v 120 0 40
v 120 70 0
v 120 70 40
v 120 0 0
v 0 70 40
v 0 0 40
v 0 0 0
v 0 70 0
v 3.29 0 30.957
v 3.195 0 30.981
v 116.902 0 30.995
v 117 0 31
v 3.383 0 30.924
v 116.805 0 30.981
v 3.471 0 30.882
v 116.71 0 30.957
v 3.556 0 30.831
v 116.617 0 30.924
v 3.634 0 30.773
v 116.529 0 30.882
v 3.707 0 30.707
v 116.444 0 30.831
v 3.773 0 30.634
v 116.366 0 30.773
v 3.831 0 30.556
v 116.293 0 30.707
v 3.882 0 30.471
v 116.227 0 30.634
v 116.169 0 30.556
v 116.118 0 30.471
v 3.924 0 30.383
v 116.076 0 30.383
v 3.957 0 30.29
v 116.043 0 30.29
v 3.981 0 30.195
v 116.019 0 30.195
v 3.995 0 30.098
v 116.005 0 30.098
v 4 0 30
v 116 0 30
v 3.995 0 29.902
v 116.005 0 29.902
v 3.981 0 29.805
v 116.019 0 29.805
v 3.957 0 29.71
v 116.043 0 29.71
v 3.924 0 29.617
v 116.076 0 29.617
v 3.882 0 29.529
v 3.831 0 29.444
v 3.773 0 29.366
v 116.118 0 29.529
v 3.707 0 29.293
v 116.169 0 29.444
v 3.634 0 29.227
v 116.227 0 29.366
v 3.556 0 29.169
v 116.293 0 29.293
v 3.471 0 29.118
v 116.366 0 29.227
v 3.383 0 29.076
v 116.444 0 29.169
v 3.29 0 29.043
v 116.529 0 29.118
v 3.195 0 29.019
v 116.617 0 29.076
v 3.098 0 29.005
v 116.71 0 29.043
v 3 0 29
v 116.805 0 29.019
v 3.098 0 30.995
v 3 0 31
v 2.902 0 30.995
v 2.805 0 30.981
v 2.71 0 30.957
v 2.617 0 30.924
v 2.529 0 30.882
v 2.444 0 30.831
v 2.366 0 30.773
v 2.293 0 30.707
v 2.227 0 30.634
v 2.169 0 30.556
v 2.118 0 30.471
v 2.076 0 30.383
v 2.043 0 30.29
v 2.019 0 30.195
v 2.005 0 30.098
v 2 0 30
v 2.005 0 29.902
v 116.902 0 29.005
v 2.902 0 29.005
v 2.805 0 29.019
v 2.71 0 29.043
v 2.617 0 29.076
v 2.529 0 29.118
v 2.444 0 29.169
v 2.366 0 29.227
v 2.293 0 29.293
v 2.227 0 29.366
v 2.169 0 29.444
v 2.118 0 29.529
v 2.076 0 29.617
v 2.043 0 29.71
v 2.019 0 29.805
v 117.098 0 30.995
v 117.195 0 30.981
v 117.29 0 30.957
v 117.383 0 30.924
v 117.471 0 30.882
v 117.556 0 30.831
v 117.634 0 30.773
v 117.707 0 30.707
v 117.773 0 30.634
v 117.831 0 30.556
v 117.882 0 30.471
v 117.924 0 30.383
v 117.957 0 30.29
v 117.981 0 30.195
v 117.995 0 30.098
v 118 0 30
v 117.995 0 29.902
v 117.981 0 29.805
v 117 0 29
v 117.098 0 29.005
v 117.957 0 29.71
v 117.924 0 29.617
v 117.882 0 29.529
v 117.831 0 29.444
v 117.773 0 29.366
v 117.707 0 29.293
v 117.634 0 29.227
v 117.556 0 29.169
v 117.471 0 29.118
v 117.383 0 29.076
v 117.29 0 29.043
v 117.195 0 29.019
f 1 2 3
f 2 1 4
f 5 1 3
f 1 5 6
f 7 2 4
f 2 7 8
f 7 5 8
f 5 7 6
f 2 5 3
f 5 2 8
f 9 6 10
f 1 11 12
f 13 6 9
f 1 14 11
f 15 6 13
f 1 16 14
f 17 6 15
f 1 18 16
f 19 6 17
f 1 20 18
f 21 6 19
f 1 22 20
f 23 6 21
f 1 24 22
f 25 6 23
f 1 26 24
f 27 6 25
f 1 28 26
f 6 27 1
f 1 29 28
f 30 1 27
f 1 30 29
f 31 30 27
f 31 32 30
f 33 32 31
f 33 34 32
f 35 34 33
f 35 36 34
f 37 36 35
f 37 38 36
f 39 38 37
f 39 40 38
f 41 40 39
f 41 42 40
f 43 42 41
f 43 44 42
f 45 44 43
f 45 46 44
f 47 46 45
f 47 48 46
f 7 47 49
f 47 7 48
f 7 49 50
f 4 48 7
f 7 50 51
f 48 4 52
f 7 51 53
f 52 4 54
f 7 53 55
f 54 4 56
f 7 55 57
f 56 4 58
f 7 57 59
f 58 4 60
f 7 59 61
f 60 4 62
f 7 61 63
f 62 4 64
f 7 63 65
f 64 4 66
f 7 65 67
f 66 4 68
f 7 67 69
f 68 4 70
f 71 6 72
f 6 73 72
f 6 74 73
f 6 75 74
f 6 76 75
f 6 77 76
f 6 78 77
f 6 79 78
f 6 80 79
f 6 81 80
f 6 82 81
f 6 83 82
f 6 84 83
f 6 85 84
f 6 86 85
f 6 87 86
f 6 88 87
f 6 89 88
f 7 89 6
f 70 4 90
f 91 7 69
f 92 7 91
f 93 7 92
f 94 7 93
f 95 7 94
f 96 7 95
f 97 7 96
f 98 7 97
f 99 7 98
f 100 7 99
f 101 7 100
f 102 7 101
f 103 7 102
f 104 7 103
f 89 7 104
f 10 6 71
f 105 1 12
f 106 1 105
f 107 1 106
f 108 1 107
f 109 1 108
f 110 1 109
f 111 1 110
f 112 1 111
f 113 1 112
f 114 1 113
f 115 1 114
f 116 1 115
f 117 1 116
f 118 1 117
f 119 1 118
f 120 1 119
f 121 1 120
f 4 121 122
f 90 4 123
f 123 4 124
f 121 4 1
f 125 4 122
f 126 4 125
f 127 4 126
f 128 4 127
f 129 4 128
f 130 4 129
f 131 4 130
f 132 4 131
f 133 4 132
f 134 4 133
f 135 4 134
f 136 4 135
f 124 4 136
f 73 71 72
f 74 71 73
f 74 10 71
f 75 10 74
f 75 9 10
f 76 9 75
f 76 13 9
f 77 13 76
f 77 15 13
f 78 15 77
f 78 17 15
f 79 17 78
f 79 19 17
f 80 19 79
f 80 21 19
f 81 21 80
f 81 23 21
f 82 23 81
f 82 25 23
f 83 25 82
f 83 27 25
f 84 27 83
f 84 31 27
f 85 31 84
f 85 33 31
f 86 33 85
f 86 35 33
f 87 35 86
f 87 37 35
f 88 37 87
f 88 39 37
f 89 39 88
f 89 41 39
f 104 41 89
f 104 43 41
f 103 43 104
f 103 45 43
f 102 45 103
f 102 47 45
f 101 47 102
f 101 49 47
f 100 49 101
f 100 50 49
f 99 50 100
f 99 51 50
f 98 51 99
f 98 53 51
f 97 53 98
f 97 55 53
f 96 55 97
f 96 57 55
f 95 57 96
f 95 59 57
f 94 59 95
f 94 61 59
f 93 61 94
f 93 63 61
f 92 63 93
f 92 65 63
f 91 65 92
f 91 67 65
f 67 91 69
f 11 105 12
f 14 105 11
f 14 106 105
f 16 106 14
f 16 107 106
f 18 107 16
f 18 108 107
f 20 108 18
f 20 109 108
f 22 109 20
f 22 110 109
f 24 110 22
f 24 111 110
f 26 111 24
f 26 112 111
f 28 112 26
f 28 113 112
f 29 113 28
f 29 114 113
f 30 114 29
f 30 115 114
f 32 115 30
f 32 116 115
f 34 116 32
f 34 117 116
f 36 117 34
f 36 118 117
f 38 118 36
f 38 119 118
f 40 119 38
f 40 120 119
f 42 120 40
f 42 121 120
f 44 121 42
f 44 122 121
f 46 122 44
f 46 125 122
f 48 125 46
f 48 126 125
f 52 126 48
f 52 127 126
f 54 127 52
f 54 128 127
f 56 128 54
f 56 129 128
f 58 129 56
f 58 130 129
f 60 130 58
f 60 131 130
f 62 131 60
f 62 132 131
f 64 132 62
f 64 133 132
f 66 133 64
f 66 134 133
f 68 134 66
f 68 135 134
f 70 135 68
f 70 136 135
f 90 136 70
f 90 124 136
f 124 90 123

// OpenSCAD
// Mini Horizontal Gel Electrophoresis Buffer Tank
// Outer dimensions: 120 (X) x 70 (Y) x 40 (Z)
// Wall thickness: 3 mm
// Floor thickness: 3 mm
// Inner platform: 60 (X) x 70 (Y) x 10 (height above inner floor)
// Electrode holes: 2 mm diameter, horizontal along X, at Y=0, Z=30 (outer coords)

$fn = 64;

// Outer Dimensions
X_out = 120;
Y_out = 70;
Z_out = 40;

// Wall Thickness
wall = 3;

// Floor Thickness
floor_t = 3;

// Inner Dimensions (calculated from outer and walls)
X_in  = X_out - 2 * wall;
Y_in  = Y_out - 2 * wall;
Z_in  = Z_out - floor_t; // Inner floor is at Z = floor_t

// Platform Dimensions
plat_len = 60; // Length in X
plat_w   = Y_in; // Spans full inner width
plat_h   = 10;  // Height above inner floor

// Electrode Hole Specs
hole_d   = 2;
hole_z   = 30;  // Z coordinate of the hole center

// Main assembly
difference() {
    union() {
        // Tank Shell
        translate([0, 0, 0]) cube([X_out, Y_out, Z_out]);
        
        // Cut inner volume (air space)
        translate([wall, wall, floor_t]) cube([X_in, Y_in, Z_in]);
        
        // Platform
        // Sits on inner floor (Z = floor_t)
        // Centered in X, Full width in Y
        translate([
            (X_out - plat_len) / 2, 
            0, 
            floor_t
        ]) 
        cube([plat_len, plat_w, plat_h]);
    }
    
    // Electrode Holes
    // Two holes, one at each end wall (X=wall and X=X_out-wall)
    // Both centered at Y=0, Z=30
    // Holes run along X axis
    
    // Left Wall Hole
    translate([wall, 0, hole_z]) {
        rotate([90, 0, 0]) cylinder(h = wall + 1, d = hole_d);
    }
    
    // Right Wall Hole
    translate([X_out - wall, 0, hole_z]) {
        rotate([90, 0, 0]) cylinder(h = wall + 1, d = hole_d);
    }
}
